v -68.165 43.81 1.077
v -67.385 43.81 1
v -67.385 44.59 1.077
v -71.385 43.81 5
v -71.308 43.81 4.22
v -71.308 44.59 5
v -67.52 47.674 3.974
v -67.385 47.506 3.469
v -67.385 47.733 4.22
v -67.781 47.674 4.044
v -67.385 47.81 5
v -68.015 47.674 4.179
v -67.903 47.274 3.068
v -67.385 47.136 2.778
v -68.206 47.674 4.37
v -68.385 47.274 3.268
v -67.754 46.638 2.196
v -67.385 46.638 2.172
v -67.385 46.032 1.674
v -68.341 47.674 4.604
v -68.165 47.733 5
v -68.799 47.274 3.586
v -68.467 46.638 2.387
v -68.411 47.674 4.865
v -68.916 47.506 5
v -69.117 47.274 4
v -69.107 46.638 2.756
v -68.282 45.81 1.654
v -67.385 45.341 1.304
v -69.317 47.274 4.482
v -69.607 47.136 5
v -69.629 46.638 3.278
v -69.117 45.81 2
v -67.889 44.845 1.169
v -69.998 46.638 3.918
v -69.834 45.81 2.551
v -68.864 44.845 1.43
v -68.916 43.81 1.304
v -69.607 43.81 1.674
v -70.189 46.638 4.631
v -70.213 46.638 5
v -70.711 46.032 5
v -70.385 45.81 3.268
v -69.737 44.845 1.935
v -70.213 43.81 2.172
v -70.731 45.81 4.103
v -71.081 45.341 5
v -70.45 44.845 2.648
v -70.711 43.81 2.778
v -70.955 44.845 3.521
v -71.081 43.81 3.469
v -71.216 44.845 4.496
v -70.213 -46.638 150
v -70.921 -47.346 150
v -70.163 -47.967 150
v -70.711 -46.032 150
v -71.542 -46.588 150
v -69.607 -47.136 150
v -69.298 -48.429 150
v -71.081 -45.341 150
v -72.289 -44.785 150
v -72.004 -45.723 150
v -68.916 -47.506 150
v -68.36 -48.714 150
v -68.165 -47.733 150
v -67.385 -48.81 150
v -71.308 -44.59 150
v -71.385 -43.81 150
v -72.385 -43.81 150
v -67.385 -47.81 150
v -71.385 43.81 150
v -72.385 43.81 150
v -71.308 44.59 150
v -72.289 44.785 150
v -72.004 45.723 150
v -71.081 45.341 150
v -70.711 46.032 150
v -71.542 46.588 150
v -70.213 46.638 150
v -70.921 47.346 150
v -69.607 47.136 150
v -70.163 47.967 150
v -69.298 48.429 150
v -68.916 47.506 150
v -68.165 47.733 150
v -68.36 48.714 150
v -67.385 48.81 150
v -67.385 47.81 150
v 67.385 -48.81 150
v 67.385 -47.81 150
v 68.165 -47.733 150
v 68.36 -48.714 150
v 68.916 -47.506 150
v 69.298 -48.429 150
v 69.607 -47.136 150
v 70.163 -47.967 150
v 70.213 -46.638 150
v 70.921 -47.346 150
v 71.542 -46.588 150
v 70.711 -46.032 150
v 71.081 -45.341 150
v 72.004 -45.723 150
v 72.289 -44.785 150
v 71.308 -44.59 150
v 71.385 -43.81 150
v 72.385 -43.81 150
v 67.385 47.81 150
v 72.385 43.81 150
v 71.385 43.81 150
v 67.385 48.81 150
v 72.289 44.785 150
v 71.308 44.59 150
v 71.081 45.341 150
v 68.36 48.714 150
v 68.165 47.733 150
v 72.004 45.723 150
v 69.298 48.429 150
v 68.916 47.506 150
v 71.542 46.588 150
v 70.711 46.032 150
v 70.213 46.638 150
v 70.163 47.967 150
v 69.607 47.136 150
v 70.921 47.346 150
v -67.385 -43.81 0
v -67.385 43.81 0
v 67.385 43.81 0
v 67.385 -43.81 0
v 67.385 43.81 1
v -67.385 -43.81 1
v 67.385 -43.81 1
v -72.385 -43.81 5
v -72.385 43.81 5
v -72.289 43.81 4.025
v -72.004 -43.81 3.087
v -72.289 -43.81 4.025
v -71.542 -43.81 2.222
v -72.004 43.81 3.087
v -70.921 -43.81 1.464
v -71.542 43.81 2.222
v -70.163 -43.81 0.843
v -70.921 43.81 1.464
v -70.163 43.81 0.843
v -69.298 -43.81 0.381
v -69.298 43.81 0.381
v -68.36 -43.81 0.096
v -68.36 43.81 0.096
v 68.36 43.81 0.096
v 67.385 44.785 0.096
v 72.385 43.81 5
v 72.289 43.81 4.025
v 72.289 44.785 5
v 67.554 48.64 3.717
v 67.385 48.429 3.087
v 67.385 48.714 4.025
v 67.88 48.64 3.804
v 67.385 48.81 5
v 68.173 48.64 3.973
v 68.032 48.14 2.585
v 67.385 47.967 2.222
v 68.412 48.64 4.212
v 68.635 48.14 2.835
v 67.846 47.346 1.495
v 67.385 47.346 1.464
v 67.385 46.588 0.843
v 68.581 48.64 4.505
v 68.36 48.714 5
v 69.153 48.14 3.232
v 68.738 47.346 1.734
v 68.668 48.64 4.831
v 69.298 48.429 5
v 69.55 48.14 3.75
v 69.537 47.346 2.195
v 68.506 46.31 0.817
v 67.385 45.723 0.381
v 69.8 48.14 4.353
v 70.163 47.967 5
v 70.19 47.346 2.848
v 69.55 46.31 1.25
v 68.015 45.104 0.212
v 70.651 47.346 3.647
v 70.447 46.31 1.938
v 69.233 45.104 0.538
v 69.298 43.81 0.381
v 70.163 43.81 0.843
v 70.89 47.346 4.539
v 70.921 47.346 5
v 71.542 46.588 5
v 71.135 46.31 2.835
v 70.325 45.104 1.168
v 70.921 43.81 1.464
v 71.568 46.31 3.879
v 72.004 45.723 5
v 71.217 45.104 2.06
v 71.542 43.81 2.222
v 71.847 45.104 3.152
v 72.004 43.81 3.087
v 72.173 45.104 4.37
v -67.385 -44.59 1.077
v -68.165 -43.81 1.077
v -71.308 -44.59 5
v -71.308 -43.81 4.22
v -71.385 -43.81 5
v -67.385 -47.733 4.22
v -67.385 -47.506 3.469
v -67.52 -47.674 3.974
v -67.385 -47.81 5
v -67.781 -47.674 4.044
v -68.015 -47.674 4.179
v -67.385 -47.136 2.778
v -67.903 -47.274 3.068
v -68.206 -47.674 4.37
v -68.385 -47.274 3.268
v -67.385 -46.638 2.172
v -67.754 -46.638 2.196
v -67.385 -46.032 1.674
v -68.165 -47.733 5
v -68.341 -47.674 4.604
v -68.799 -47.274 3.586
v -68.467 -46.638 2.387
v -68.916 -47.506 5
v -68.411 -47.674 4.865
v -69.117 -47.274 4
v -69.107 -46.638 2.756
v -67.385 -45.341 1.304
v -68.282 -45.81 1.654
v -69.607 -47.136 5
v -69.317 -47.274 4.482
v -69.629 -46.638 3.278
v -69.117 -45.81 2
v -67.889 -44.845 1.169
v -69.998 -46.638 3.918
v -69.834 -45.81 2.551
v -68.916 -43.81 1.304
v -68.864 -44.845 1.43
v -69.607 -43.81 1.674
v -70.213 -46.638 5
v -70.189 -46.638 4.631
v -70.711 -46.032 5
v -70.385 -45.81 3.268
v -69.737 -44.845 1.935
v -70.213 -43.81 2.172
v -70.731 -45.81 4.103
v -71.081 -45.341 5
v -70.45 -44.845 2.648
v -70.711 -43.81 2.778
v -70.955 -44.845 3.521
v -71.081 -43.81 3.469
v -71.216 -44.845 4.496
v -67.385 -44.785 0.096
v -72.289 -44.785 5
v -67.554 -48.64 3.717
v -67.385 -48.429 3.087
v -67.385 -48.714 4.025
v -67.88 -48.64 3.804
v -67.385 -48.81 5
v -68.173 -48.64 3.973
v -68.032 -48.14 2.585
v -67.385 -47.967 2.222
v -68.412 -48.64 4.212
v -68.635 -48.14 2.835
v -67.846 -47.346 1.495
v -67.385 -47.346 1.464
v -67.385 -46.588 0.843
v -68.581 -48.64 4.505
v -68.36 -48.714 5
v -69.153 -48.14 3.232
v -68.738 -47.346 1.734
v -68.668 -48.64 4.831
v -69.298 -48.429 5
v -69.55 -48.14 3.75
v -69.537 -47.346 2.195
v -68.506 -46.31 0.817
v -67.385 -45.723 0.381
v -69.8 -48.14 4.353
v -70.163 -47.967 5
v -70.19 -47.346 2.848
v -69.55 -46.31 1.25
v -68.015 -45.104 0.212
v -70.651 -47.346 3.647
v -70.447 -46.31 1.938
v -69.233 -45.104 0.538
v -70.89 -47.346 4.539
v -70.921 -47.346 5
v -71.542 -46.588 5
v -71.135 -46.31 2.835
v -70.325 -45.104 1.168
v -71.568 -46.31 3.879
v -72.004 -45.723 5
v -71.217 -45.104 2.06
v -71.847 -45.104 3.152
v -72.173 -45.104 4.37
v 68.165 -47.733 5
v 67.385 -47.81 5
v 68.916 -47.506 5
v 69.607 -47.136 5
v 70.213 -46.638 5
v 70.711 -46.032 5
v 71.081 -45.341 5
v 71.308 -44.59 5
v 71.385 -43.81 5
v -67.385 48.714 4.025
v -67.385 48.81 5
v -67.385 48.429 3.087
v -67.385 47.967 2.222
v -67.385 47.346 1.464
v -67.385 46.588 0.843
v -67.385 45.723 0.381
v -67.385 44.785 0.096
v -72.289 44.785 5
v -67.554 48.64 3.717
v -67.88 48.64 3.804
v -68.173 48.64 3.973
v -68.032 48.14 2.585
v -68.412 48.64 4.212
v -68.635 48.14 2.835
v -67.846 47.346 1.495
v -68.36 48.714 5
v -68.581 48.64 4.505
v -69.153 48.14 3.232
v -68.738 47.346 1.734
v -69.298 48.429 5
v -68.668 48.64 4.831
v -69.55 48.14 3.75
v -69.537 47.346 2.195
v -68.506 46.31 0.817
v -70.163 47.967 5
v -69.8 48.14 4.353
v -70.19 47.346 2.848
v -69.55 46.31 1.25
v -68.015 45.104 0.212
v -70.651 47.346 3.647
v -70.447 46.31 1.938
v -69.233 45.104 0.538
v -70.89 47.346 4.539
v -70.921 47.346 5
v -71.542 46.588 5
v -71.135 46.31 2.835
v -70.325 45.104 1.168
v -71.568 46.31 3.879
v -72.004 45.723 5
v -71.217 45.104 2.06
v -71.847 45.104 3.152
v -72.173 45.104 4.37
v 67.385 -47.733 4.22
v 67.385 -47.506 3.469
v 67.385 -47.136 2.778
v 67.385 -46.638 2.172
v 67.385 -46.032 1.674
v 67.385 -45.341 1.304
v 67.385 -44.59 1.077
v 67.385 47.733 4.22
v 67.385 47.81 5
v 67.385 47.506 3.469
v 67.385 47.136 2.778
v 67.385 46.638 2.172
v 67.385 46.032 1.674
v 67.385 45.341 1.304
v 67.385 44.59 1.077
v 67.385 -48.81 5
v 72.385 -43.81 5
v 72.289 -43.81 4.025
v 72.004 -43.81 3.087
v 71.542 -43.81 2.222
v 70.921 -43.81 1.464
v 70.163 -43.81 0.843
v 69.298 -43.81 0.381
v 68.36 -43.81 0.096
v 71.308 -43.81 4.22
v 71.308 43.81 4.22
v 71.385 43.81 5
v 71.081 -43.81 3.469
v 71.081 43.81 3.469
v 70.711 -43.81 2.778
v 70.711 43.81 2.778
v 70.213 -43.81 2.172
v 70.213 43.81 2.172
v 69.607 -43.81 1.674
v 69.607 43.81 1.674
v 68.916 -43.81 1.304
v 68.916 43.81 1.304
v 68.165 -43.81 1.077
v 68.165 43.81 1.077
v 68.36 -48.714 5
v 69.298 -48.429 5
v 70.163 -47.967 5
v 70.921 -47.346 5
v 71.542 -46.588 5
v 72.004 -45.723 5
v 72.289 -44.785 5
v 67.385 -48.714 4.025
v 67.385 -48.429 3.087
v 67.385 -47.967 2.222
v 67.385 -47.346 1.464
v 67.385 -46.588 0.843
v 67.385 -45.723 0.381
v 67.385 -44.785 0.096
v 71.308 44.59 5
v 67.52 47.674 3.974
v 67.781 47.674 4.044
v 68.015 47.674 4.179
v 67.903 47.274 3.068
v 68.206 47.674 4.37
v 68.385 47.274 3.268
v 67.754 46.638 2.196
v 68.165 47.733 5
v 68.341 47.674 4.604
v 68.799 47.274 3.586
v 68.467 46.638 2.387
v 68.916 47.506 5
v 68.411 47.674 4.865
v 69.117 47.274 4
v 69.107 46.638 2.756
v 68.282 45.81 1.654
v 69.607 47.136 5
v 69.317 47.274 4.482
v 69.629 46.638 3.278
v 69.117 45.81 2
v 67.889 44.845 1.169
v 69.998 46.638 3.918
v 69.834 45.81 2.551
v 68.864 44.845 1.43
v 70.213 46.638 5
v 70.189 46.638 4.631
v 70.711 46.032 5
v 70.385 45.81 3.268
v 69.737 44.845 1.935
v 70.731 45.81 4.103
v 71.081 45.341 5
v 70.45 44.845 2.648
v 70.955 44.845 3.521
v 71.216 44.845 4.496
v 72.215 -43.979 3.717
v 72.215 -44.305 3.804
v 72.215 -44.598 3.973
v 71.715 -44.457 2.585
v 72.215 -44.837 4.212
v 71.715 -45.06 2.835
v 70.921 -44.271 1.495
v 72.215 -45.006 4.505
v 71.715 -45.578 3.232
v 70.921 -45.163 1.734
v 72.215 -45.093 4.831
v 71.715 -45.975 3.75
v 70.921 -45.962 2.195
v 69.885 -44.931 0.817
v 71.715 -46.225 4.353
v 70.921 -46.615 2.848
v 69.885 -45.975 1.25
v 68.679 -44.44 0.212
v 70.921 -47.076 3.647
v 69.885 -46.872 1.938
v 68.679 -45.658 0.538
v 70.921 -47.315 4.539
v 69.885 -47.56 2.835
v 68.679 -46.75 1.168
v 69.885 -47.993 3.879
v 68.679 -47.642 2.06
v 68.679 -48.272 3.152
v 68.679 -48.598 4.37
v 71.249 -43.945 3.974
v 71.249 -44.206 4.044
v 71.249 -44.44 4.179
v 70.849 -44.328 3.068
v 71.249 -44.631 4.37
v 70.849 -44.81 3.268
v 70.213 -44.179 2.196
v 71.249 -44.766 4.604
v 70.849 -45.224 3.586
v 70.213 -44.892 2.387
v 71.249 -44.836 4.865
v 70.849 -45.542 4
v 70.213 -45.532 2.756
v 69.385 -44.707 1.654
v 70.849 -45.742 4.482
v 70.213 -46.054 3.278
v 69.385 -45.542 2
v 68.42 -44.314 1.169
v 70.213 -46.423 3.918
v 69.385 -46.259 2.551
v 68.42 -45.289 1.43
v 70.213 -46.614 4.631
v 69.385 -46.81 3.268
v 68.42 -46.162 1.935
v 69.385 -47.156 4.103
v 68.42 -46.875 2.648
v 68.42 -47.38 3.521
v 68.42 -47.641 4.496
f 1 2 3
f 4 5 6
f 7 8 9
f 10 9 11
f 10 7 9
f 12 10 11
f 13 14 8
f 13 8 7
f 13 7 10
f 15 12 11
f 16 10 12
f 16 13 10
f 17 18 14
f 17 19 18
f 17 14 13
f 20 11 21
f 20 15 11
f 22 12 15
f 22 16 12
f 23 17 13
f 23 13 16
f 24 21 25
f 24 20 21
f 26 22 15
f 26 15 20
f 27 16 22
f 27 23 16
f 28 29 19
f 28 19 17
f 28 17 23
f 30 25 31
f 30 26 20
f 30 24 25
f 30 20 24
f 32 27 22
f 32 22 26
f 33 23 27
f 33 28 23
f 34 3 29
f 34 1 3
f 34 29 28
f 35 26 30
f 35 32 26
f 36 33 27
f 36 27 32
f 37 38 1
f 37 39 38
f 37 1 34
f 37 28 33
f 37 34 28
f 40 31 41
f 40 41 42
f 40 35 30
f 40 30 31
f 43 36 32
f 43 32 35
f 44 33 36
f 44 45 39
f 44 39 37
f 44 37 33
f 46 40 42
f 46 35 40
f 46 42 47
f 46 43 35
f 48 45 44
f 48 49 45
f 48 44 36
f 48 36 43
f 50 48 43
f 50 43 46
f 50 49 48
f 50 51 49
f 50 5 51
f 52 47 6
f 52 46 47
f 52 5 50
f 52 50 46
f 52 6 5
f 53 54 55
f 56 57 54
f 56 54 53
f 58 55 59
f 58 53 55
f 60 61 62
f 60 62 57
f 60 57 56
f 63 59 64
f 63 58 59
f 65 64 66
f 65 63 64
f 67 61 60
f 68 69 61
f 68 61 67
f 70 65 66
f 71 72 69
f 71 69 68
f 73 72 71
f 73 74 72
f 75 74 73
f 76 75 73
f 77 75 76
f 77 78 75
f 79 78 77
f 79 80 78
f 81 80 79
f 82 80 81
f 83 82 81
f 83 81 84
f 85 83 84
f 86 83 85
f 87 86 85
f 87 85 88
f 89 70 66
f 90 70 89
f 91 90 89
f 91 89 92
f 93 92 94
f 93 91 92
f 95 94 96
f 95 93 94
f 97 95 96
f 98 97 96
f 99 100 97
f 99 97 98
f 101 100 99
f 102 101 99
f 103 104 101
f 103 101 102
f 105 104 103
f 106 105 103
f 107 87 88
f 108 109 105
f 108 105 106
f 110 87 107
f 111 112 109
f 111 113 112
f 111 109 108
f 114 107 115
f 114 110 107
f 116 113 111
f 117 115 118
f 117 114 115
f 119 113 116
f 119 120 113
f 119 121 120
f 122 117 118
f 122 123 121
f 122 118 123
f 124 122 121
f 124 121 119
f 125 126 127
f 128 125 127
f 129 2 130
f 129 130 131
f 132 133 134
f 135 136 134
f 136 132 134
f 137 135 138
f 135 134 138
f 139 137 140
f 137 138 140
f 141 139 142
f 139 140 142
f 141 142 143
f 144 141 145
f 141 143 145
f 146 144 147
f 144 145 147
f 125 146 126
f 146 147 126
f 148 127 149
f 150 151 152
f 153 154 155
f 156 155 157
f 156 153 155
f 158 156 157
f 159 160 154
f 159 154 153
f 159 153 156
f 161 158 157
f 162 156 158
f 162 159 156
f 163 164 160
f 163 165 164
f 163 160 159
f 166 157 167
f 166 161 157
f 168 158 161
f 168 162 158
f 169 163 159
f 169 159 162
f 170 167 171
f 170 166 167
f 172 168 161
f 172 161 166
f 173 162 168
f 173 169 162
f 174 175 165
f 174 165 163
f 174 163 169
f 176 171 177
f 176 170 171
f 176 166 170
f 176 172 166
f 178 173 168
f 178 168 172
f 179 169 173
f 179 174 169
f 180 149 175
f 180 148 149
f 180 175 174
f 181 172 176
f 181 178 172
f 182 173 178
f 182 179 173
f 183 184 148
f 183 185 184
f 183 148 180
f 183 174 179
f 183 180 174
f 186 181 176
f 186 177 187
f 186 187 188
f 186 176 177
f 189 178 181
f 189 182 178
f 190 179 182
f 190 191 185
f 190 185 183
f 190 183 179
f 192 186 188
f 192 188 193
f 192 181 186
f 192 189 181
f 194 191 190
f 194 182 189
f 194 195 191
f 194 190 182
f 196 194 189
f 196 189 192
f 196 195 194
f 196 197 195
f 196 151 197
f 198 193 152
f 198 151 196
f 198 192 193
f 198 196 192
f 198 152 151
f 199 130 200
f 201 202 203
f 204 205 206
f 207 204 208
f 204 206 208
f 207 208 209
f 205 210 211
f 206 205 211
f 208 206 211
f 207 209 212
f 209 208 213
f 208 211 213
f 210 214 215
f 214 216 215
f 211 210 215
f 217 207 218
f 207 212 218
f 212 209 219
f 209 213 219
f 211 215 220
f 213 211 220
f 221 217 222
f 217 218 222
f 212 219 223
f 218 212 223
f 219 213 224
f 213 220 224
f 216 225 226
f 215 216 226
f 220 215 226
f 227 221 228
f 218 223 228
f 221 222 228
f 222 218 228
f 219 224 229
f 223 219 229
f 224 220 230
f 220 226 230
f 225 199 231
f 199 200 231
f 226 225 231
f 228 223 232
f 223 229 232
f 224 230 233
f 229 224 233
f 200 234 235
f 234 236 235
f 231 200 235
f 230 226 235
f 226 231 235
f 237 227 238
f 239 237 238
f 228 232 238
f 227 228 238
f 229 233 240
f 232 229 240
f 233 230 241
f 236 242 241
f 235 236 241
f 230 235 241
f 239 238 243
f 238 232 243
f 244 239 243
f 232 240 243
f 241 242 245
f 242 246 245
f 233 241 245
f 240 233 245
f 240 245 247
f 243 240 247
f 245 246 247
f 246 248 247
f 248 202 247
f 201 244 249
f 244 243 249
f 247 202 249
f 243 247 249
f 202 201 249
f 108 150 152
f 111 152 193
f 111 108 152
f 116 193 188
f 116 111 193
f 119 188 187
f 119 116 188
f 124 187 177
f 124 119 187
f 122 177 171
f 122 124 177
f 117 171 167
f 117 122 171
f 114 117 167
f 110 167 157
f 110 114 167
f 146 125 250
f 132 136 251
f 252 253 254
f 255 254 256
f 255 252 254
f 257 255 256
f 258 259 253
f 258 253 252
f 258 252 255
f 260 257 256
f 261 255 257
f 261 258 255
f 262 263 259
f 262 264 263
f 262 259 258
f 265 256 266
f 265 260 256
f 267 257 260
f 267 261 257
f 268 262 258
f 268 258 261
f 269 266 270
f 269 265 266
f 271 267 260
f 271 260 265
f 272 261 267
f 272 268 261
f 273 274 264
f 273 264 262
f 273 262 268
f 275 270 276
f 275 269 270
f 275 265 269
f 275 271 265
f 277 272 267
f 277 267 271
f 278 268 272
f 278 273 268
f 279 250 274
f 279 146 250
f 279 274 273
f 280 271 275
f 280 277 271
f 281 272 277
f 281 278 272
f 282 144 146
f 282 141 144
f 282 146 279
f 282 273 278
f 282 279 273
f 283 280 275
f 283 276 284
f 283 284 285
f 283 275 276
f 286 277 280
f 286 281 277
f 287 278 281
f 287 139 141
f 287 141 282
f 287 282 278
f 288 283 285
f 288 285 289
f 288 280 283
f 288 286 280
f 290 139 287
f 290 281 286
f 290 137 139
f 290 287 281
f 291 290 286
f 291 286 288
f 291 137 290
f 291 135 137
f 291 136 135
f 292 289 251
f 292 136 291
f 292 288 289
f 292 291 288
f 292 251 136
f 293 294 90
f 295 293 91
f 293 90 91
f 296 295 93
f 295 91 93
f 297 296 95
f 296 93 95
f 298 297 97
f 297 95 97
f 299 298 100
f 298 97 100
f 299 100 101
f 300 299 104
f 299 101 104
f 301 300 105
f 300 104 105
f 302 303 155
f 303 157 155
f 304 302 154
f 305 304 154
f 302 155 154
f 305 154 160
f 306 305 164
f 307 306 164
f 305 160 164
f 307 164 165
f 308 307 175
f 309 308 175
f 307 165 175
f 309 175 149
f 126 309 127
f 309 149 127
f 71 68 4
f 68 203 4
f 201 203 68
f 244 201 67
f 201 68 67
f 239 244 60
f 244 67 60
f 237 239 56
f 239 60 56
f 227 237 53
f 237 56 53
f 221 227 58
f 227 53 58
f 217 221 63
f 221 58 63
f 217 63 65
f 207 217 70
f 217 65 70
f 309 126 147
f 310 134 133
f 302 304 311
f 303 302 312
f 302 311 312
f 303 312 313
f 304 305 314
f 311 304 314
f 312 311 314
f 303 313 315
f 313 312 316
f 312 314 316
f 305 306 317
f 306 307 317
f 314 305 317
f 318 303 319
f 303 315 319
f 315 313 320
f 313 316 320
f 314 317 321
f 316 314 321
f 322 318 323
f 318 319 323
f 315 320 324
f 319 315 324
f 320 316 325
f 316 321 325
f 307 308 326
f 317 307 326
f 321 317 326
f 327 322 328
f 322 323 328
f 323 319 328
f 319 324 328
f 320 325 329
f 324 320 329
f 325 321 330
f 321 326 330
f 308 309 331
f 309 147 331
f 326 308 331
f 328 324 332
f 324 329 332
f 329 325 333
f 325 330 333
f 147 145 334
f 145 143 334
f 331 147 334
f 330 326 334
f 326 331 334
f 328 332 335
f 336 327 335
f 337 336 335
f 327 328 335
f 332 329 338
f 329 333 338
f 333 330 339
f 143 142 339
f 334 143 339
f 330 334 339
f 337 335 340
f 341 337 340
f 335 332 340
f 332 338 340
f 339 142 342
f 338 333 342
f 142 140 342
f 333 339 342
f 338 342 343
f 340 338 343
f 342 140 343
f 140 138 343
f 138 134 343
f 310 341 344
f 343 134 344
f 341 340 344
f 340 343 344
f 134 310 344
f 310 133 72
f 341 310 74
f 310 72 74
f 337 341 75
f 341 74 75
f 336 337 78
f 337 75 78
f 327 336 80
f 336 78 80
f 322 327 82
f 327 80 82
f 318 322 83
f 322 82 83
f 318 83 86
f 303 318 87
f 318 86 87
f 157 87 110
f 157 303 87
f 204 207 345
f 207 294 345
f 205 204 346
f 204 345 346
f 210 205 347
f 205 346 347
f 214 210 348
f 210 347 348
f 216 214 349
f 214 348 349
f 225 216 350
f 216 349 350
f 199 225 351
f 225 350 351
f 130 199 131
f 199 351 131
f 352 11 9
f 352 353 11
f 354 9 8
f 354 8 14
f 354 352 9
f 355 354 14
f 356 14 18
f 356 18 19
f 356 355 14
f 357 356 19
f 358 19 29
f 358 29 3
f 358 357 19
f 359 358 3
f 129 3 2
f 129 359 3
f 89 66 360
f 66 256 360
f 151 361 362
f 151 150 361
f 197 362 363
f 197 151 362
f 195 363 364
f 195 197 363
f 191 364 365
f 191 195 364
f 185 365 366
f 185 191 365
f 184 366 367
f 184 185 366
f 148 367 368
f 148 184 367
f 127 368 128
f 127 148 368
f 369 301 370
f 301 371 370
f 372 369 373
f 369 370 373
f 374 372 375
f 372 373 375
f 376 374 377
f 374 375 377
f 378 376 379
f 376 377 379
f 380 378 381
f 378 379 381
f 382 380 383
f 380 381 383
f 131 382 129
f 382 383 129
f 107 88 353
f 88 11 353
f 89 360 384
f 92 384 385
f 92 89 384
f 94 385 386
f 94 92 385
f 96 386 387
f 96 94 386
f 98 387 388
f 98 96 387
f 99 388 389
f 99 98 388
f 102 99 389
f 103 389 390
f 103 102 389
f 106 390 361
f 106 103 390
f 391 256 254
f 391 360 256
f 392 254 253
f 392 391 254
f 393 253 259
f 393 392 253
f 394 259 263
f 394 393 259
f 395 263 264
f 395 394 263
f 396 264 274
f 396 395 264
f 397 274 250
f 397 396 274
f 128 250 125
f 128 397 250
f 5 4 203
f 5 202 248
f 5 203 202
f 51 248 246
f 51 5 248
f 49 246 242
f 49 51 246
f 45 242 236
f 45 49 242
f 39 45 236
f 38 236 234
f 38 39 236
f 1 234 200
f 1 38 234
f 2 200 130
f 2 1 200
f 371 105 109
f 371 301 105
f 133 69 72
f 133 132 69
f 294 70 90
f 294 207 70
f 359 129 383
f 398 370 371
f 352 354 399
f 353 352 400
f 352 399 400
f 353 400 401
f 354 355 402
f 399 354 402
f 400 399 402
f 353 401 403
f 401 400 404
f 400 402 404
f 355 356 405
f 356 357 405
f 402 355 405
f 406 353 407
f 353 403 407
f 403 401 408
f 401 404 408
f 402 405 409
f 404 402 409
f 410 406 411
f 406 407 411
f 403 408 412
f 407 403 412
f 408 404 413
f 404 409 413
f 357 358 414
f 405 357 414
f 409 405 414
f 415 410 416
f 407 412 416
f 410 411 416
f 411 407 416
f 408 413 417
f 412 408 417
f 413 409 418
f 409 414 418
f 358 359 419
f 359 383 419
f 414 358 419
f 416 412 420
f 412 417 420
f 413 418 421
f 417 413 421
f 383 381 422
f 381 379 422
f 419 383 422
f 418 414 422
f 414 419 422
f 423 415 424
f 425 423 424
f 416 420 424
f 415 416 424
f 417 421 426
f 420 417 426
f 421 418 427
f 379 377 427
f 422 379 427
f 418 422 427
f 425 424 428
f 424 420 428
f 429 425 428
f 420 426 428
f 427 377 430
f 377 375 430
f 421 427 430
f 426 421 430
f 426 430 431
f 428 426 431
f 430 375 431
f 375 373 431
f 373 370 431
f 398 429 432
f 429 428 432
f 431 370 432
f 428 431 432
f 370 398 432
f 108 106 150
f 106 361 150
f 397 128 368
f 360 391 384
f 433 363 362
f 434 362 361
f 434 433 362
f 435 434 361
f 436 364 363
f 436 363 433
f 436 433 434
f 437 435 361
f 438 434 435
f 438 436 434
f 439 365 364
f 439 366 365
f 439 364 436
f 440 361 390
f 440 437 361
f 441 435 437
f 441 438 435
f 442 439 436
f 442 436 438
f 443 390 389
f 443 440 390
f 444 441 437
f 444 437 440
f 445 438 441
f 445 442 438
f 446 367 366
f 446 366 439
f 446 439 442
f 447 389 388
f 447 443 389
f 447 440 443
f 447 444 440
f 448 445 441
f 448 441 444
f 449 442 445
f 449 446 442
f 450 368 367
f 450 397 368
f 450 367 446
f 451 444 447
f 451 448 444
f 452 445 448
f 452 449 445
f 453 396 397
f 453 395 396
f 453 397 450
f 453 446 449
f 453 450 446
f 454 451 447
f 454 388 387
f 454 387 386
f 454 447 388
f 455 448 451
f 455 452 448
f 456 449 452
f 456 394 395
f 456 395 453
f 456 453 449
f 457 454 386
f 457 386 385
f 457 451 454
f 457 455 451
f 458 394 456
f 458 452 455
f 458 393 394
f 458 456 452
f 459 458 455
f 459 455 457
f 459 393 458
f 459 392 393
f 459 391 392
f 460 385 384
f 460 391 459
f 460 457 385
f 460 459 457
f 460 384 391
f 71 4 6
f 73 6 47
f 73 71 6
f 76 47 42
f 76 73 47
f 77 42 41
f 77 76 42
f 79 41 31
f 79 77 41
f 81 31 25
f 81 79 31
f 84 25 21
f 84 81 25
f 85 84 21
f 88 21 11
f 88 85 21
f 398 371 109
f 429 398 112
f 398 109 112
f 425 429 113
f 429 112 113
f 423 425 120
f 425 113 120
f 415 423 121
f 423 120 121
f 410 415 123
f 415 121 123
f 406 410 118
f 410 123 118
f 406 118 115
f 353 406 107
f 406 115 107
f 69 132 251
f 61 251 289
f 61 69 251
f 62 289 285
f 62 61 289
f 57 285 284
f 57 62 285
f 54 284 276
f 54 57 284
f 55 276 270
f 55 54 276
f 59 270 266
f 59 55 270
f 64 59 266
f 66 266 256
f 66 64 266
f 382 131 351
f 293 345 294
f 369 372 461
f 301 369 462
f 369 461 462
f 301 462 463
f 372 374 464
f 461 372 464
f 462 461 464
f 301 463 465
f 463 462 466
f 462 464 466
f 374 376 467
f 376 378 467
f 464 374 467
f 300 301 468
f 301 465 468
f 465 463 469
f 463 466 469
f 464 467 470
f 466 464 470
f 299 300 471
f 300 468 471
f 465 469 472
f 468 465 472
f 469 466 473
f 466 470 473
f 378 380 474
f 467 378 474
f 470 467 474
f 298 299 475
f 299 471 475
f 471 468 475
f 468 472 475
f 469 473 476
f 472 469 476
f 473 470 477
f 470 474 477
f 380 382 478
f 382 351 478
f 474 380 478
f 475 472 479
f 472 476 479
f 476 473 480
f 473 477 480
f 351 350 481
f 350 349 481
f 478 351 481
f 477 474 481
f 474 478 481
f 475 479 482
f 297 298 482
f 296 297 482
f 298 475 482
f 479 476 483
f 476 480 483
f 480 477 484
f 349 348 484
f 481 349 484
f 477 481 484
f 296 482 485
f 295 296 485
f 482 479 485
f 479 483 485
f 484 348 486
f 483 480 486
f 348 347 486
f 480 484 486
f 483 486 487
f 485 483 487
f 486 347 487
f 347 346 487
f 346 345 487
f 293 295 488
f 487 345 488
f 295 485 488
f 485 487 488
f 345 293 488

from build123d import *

# Parameters (mm, degrees)
F0_W     = 144.77
F0_H     = 97.62
F1_DEPTH = 150
F2_R     = 5
F3_T     = -1


with BuildPart() as f1:
    # F0 (on Top) → F1 (new body)
    with BuildSketch(Plane.XY):
        Rectangle(F0_W, F0_H)
    extrude(amount=F1_DEPTH)

    # F2
    f2_edges = [f1.edges().sort_by_distance(p)[0] for p in [
        (-72.385, 0, 0),
        (0, -48.81, 0),
        (72.385, 0, 0),
        (0, 48.81, 0),
        (-72.385, -48.81, 75),
        (-72.385, 48.81, 75),
        (72.385, -48.81, 75),
        (72.385, 48.81, 75),
    ]]
    fillet(f2_edges, radius=F2_R)

    # F3
    f3_openings = [f1.faces().sort_by_distance(p)[0] for p in [
        (0, 0, 150),
    ]]
    offset(amount=F3_T, openings=f3_openings)


solid = f1.part
